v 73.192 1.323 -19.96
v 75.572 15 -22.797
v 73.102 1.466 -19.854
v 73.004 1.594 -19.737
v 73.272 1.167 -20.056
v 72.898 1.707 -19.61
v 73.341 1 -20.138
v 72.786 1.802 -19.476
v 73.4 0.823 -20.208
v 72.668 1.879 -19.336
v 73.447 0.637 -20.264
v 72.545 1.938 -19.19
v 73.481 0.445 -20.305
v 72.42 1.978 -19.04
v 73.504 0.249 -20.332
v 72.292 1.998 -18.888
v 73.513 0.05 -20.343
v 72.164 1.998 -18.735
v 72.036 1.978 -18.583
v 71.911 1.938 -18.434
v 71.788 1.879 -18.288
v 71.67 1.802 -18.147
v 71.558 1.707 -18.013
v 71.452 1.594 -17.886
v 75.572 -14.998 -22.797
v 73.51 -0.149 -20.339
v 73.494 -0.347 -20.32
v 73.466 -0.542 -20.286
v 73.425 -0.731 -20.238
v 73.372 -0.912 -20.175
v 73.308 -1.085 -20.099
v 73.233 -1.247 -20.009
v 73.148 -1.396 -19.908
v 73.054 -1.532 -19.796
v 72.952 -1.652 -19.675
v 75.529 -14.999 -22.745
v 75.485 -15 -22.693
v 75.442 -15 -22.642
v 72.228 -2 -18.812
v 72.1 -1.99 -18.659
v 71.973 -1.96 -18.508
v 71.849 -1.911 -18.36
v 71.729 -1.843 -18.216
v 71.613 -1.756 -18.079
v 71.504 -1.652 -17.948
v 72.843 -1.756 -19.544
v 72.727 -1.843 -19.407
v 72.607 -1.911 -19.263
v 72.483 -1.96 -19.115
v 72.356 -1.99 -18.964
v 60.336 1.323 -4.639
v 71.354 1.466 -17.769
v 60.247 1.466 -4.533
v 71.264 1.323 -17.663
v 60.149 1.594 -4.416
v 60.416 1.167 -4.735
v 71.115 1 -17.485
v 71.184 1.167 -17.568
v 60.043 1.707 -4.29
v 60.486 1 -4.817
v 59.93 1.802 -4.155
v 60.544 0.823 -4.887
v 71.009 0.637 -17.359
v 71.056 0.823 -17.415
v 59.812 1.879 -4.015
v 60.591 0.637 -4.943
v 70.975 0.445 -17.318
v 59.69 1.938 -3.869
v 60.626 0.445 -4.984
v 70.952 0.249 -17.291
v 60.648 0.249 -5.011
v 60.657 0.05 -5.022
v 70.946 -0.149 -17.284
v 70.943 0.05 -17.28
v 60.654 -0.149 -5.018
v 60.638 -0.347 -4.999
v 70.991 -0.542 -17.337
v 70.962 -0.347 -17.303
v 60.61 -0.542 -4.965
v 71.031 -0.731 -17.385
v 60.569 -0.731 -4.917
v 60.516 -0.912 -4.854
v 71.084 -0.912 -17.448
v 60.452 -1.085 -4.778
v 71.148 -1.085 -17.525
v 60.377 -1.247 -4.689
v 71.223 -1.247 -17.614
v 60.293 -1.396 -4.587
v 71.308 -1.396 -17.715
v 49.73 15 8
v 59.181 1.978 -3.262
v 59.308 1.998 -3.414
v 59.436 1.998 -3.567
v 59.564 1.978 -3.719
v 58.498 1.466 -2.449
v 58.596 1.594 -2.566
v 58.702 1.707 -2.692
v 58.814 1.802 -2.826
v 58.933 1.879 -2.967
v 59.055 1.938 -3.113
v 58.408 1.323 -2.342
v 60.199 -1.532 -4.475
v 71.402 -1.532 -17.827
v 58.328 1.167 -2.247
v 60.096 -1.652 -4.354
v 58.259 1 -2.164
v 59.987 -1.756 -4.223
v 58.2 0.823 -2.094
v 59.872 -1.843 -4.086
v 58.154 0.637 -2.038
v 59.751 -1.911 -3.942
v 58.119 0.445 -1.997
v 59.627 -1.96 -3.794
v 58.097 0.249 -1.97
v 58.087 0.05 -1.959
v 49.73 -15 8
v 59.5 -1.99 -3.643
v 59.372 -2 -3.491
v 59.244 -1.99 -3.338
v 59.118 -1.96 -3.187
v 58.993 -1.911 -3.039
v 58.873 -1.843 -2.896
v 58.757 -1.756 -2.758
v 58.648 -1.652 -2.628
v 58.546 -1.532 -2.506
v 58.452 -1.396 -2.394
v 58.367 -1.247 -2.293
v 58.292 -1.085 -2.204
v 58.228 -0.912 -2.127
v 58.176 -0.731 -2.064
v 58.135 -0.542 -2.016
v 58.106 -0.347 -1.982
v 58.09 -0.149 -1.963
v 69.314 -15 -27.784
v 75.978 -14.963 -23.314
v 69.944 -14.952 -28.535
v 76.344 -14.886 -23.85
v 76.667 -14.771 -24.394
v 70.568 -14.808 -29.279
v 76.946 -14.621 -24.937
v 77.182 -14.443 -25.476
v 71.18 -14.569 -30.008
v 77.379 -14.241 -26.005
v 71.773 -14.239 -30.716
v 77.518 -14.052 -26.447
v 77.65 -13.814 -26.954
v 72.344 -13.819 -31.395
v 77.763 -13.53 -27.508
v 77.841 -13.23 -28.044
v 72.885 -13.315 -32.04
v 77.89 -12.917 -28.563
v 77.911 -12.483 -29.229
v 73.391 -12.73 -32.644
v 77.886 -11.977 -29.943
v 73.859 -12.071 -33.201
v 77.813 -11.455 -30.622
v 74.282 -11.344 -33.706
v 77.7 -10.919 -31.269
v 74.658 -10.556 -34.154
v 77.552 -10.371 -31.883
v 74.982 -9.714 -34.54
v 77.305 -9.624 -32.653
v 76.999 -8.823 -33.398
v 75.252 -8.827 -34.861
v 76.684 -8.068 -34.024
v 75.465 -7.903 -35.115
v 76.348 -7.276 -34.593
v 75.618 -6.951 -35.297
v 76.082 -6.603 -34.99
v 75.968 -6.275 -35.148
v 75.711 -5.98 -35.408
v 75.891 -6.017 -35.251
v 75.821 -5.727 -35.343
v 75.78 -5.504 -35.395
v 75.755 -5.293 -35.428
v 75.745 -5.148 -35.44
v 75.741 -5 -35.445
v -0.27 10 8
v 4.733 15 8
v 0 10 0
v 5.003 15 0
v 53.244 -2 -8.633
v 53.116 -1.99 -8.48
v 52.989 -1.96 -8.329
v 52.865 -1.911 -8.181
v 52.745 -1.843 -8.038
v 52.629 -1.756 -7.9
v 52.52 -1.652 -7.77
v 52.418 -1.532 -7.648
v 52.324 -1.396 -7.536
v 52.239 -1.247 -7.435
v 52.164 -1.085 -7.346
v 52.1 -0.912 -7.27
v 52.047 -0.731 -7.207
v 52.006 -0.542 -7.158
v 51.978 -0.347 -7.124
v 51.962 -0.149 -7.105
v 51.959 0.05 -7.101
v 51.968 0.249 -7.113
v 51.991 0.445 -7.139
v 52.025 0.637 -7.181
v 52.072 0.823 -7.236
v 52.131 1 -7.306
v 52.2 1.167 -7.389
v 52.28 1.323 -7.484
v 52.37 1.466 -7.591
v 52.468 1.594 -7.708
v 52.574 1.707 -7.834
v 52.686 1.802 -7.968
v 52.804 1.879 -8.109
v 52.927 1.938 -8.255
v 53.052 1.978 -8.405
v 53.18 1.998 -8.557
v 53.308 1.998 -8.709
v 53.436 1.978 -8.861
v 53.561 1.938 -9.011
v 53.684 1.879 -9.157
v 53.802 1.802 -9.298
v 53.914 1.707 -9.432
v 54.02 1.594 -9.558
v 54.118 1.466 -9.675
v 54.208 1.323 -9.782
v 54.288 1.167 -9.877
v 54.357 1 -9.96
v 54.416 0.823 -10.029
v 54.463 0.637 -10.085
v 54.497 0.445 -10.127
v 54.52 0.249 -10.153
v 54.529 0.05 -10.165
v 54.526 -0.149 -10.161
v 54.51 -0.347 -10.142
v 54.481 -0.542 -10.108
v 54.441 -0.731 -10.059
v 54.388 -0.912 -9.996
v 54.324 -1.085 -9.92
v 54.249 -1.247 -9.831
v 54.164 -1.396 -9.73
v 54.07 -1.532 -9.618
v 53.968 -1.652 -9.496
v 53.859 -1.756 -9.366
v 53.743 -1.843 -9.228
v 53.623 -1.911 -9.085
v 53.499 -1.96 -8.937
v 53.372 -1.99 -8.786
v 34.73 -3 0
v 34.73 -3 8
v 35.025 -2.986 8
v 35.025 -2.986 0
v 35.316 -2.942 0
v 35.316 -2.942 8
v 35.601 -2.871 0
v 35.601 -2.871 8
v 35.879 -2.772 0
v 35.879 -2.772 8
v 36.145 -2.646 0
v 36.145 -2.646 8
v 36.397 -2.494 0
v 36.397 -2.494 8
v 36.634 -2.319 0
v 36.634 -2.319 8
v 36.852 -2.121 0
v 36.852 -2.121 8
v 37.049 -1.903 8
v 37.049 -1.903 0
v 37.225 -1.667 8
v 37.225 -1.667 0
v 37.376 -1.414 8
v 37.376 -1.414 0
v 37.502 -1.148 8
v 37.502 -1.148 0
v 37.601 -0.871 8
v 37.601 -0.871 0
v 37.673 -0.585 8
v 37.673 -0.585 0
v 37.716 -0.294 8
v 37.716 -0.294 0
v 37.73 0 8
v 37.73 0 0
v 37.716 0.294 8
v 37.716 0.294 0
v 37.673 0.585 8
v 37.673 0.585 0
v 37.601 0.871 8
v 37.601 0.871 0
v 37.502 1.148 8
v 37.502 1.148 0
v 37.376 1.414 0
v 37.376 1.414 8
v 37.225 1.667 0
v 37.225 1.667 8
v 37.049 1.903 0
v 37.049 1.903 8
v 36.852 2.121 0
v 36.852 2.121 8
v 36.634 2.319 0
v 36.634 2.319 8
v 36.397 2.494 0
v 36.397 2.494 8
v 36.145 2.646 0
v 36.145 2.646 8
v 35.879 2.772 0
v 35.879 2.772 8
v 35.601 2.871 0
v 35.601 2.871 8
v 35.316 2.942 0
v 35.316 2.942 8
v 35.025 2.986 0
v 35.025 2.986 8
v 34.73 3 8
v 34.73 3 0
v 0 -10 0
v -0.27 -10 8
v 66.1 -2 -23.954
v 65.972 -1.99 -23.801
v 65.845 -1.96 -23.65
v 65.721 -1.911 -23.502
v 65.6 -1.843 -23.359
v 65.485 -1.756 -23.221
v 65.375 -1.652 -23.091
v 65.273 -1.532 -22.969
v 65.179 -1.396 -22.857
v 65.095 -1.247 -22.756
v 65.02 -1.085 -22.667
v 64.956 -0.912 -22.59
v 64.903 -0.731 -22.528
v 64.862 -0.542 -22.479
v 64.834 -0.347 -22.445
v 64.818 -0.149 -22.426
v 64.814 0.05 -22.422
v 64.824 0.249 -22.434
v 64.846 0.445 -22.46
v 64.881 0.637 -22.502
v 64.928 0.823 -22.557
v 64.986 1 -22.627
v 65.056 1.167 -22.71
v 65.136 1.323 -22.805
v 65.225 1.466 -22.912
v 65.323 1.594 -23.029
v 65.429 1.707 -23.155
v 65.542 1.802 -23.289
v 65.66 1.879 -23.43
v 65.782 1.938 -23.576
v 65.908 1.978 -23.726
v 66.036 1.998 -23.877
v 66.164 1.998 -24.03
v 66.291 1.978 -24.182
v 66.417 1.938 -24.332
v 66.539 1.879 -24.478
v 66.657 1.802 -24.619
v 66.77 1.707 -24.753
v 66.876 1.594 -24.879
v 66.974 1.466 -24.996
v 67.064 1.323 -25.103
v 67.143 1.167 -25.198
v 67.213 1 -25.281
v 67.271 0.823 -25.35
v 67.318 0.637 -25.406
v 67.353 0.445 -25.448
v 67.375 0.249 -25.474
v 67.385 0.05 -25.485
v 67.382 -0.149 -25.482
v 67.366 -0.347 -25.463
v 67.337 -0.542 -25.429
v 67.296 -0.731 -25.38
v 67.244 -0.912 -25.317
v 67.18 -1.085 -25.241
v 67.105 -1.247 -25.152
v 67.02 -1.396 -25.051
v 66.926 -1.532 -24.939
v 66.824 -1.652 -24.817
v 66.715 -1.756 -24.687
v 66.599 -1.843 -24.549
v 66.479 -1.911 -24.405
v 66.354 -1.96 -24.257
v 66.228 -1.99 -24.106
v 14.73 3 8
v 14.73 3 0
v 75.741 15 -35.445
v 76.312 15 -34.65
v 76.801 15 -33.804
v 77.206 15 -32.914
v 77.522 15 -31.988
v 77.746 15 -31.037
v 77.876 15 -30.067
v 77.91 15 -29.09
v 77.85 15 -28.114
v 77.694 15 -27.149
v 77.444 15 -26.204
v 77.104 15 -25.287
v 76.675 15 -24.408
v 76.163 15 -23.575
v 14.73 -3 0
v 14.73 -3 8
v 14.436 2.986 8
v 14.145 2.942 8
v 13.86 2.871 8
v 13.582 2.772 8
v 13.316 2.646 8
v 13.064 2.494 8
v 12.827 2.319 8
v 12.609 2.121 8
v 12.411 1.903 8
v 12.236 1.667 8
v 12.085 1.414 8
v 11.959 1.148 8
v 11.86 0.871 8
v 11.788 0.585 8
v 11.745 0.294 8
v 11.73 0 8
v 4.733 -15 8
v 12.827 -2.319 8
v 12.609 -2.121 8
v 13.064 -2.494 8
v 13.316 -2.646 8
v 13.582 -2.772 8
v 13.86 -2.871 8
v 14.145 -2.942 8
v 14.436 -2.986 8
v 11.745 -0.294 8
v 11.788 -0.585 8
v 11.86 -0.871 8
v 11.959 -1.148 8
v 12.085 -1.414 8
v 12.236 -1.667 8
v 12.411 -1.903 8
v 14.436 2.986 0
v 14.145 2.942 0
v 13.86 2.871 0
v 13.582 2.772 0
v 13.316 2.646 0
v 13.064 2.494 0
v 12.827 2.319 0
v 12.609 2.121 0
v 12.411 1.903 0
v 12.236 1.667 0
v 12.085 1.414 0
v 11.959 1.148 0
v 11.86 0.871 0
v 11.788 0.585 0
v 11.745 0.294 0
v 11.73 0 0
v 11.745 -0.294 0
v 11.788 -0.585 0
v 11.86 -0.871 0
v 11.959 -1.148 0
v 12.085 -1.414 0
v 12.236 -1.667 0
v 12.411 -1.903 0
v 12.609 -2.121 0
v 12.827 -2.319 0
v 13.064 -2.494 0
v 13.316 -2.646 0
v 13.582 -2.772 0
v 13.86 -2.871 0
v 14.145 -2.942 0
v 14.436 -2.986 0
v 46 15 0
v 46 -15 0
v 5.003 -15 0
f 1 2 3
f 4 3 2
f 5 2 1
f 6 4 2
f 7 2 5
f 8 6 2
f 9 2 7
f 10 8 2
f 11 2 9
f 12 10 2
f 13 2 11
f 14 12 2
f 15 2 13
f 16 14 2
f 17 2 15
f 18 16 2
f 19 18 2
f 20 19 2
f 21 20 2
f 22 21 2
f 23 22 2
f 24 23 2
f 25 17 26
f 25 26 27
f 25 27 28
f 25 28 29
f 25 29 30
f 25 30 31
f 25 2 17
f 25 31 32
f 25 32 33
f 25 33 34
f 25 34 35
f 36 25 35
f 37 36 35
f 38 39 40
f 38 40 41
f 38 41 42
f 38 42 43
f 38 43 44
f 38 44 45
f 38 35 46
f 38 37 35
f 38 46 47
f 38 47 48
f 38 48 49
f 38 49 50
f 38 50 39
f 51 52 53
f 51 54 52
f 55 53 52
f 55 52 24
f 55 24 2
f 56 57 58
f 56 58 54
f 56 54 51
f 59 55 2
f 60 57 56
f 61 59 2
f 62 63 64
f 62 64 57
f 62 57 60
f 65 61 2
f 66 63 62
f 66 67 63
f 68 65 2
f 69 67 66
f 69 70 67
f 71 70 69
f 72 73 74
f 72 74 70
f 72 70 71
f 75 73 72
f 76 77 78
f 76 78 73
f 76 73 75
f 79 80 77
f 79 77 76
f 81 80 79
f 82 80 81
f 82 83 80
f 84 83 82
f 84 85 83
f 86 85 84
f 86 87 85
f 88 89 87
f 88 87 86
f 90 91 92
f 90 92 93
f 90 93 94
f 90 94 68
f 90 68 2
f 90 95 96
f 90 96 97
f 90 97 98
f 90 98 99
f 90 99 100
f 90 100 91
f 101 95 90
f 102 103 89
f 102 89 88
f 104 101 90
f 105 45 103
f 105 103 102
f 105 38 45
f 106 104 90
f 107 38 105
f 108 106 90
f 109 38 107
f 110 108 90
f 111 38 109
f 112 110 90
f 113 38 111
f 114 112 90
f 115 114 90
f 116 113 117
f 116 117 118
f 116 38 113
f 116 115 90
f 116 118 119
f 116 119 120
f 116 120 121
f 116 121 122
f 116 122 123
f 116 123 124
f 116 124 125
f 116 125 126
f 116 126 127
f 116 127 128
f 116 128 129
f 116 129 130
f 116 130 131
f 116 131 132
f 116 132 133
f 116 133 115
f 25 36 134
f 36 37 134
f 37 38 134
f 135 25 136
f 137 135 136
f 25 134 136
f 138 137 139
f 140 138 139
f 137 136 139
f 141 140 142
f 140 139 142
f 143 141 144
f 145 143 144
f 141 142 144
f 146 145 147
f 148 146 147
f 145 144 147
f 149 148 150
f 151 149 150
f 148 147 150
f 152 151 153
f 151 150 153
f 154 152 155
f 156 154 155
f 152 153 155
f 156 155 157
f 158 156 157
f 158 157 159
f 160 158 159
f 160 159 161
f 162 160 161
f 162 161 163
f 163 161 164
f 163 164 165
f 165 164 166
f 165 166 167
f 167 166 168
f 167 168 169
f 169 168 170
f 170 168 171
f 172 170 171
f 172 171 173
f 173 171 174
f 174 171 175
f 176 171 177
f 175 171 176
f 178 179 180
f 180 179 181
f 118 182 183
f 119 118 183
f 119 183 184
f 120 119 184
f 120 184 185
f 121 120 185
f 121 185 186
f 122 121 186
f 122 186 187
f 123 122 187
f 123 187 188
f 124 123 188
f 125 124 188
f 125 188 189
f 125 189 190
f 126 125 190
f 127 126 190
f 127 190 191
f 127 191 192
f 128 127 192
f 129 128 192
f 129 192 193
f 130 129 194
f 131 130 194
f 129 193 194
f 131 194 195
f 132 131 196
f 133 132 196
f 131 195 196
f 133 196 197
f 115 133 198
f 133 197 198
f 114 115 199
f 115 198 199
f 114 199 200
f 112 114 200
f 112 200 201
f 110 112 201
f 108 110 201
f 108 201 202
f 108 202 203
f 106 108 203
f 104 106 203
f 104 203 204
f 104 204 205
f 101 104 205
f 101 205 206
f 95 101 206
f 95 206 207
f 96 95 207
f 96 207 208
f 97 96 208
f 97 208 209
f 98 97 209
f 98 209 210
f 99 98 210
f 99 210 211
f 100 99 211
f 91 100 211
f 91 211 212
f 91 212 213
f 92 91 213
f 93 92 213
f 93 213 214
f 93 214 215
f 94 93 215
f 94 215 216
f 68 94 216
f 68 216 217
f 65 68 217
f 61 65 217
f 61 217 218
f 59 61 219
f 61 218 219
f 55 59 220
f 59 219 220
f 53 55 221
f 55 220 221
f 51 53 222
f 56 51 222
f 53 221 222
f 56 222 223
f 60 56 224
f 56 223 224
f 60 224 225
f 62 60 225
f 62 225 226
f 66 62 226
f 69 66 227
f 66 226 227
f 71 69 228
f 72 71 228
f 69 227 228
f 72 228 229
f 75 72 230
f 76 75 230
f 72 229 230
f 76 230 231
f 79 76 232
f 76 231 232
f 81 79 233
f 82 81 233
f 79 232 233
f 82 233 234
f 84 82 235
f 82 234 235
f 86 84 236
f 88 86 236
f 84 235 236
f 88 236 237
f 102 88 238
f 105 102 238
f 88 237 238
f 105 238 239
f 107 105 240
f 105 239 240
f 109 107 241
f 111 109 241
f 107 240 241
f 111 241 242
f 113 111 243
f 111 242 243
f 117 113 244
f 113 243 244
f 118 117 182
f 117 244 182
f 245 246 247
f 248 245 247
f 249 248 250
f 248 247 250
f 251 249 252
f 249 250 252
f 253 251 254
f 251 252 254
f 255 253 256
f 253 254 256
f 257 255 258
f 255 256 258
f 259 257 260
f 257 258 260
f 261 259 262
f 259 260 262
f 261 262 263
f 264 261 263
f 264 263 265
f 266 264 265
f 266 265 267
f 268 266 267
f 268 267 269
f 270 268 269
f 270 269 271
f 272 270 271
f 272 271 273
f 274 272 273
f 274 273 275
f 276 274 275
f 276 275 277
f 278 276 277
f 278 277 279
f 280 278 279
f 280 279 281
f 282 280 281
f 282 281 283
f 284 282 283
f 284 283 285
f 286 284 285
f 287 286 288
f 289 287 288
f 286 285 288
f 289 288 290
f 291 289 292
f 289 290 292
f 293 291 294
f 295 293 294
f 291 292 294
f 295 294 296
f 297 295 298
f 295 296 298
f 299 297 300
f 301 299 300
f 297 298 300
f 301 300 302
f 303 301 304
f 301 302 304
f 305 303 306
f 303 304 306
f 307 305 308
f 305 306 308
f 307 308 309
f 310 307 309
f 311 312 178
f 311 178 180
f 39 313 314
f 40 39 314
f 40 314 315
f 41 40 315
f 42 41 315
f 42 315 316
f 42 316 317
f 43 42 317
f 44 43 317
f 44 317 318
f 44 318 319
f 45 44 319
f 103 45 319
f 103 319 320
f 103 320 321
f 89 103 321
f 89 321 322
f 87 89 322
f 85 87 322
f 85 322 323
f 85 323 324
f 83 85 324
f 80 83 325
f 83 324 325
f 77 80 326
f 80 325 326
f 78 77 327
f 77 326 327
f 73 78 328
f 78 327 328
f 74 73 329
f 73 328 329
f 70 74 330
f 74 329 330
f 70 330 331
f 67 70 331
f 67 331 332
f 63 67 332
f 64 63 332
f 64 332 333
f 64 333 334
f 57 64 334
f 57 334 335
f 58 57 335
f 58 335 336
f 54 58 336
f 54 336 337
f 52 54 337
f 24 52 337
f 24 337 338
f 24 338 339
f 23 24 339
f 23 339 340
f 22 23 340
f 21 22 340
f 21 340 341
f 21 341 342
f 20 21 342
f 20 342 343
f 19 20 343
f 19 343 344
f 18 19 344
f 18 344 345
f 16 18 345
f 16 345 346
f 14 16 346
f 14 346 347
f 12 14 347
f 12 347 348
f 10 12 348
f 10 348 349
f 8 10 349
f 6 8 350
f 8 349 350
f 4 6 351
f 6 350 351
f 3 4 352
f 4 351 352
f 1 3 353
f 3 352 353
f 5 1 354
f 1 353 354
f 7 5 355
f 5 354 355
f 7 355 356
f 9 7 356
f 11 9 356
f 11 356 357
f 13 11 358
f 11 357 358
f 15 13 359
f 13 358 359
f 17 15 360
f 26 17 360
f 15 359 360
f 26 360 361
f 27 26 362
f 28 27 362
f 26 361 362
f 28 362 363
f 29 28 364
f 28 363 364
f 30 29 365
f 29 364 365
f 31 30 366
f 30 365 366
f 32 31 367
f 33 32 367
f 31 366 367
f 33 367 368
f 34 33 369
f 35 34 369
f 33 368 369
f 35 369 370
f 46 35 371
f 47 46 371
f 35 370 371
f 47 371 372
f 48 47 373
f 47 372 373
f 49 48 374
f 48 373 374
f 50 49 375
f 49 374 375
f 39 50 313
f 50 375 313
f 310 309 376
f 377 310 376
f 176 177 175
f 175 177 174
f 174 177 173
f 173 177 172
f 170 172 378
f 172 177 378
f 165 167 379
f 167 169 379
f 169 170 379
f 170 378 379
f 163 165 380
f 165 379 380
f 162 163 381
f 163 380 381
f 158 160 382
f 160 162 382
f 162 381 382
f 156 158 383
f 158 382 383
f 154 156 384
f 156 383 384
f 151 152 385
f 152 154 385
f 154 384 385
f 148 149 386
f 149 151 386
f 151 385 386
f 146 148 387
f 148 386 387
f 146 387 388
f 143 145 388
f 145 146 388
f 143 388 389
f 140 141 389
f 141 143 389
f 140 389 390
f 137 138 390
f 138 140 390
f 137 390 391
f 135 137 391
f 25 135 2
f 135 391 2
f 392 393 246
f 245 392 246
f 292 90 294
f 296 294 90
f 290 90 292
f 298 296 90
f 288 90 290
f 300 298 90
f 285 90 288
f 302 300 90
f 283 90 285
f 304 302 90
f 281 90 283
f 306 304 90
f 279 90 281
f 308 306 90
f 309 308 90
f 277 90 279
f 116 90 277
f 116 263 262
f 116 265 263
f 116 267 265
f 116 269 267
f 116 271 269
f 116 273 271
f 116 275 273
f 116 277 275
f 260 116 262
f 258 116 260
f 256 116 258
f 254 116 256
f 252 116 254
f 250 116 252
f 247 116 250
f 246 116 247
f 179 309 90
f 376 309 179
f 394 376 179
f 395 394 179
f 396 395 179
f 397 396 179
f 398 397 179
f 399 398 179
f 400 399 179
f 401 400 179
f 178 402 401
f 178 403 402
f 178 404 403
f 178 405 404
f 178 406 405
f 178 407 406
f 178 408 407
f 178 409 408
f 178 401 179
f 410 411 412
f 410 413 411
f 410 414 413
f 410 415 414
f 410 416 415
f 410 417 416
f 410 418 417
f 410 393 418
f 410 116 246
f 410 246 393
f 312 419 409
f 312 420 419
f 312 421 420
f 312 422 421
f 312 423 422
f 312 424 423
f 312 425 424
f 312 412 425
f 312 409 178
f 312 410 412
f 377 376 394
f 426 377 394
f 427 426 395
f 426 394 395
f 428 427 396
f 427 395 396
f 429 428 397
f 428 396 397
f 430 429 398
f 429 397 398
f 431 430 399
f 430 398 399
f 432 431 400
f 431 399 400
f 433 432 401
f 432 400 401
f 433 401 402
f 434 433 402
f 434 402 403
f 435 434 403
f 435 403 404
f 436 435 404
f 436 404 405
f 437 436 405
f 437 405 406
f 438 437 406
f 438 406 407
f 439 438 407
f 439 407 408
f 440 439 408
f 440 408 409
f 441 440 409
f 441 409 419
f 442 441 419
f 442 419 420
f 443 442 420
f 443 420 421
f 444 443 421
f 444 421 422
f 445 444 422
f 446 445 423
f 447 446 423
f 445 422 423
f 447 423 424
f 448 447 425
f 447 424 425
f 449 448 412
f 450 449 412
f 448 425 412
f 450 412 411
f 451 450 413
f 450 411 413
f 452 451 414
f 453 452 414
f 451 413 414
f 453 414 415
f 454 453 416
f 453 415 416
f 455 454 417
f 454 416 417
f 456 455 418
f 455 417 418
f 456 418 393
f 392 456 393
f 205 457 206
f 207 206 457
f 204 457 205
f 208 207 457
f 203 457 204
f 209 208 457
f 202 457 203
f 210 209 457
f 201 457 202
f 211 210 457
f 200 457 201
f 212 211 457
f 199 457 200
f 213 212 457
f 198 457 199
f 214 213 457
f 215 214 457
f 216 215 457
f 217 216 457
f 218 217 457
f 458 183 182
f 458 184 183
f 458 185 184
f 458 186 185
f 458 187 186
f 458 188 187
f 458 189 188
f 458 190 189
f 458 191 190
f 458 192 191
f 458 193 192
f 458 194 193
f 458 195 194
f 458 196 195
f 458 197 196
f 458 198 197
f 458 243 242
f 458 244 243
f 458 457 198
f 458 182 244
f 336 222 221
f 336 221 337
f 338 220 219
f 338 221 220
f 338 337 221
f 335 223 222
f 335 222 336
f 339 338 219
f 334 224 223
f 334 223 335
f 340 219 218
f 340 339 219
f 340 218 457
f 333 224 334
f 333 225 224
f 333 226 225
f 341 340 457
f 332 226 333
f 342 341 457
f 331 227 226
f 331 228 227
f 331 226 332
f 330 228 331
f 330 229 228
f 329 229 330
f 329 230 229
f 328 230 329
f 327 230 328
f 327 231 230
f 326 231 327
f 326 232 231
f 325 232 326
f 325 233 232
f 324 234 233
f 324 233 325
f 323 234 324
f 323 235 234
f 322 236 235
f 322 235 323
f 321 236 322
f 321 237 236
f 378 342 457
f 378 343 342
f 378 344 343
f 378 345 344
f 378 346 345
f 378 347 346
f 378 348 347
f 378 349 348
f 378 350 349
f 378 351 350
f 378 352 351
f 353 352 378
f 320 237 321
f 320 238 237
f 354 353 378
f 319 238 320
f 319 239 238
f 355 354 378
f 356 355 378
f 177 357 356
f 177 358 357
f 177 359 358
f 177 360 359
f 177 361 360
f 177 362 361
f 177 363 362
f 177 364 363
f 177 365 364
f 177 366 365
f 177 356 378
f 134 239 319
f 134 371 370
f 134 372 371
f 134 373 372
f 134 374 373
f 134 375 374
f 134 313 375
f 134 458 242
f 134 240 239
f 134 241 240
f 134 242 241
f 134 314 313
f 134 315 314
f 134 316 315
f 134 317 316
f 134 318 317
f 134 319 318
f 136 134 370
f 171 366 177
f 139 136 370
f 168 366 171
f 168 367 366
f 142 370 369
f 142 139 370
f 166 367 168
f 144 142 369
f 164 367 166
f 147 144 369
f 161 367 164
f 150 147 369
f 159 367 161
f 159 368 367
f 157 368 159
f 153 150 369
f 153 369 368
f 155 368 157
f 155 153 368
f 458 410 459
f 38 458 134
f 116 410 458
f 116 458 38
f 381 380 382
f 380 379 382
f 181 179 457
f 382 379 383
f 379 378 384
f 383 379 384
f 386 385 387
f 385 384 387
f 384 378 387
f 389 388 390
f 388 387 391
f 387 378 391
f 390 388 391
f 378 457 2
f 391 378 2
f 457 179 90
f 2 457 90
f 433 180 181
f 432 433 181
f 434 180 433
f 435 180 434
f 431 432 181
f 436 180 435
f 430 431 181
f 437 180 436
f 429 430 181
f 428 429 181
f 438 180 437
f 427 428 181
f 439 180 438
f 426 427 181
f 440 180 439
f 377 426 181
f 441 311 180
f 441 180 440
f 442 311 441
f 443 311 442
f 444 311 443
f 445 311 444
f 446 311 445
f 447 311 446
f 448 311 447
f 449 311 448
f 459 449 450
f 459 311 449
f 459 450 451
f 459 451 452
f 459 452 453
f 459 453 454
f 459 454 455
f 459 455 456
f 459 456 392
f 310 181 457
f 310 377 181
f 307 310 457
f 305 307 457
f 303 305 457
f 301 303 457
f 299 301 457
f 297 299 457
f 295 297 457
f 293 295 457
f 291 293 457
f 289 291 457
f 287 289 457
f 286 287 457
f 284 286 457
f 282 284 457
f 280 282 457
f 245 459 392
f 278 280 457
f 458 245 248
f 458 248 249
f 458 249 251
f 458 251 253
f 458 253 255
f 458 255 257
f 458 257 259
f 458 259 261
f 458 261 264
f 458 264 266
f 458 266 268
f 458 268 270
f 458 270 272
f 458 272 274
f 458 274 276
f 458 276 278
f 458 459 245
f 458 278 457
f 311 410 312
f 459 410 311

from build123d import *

# Parameters (mm, degrees)
F1_DEPTH    = 15
F3_DEPTH    = 43.4455230334
F5_D        = 4
F6_T1_DEPTH = 78.9897948557
F6_T3_DEPTH = 58
F7_SIZE     = 5


# Not quite as in the source:
# - a fillet or chamfer that OpenCascade refuses, or shapes differently, is made with other operations: its cross-section is extruded or revolved along the edge and cut away or added


with BuildPart() as f1:
    # F0 (on Front) → F1 (new body, symmetric)
    with BuildSketch(Plane.XZ):
        Polygon((-0.2695387348, 8), (0, 0), (46, 0), (75.7414862046, -35.4445230334), (81.8698417496, -30.3022221559), (49.7304612652, 8), align=None)
    extrude(amount=F1_DEPTH, both=True)

    # F2 (on face) → F3 (cut, through all)
    with BuildSketch(Plane.XY.offset(8)):
        with BuildLine():
            ThreePointArc((14.7304612652, 3), (11.7304612652, 0), (14.7304612652, -3))
            Line((14.7304612652, -3), (34.7304612652, -3))
            ThreePointArc((34.7304612652, -3), (37.7304612652, 0), (34.7304612652, 3))
            Line((34.7304612652, 3), (14.7304612652, 3))
        make_face()
    extrude(amount=-F3_DEPTH, mode=Mode.SUBTRACT)

    # F5 (through all)
    with Locations(Plane(origin=(33.1222636313, 0, 27.7928791968), x_dir=(0, 1, 0), z_dir=(0.7660444431, 0, 0.6427876097))):
        with Locations((0, -40.8377687803), (0, -60.8377687803)):
            Hole(F5_D / 2)

    # F6: fillet of radius 10 on 2 edges, made by hand

    # F6_s2 → F6_t1 (cut)
    with BuildSketch(Plane.XZ.offset(-39.4948974278)):
        with BuildLine():
            ThreePointArc((75.7414862046, -35.4445230334), (77.9104912295, -29.0903052725), (75.5718351227, -22.7965501322))
            Line((75.5718351227, -22.7965501322), (81.8698417496, -30.3022221559))
            Line((81.8698417496, -30.3022221559), (75.7414862046, -35.4445230334))
        make_face()
    extrude(amount=F6_T1_DEPTH, mode=Mode.SUBTRACT)

    # F6_s4 → F6_t3 (cut)
    with BuildSketch(Plane(origin=(7.8427970084, 0, 6.5808880771), x_dir=(0, 1, 0), z_dir=(0.7660444431, 0, 0.6427876097))):
        with BuildLine():
            ThreePointArc((-15, -65.8377687803), (-12.0710678119, -72.9088365922), (-5, -75.8377687803))
            Line((-5, -75.8377687803), (-15, -75.8377687803))
            Line((-15, -75.8377687803), (-15, -65.8377687803))
        make_face()
    extrude(amount=F6_T3_DEPTH, mode=Mode.SUBTRACT)

    # F7
    f7_edges = [f1.edges().sort_by_distance(p)[0] for p in [
        (-0.134769, -15, 4),
        (-0.134769, 15, 4),
    ]]
    chamfer(f7_edges, length=F7_SIZE)


solid = f1.part
